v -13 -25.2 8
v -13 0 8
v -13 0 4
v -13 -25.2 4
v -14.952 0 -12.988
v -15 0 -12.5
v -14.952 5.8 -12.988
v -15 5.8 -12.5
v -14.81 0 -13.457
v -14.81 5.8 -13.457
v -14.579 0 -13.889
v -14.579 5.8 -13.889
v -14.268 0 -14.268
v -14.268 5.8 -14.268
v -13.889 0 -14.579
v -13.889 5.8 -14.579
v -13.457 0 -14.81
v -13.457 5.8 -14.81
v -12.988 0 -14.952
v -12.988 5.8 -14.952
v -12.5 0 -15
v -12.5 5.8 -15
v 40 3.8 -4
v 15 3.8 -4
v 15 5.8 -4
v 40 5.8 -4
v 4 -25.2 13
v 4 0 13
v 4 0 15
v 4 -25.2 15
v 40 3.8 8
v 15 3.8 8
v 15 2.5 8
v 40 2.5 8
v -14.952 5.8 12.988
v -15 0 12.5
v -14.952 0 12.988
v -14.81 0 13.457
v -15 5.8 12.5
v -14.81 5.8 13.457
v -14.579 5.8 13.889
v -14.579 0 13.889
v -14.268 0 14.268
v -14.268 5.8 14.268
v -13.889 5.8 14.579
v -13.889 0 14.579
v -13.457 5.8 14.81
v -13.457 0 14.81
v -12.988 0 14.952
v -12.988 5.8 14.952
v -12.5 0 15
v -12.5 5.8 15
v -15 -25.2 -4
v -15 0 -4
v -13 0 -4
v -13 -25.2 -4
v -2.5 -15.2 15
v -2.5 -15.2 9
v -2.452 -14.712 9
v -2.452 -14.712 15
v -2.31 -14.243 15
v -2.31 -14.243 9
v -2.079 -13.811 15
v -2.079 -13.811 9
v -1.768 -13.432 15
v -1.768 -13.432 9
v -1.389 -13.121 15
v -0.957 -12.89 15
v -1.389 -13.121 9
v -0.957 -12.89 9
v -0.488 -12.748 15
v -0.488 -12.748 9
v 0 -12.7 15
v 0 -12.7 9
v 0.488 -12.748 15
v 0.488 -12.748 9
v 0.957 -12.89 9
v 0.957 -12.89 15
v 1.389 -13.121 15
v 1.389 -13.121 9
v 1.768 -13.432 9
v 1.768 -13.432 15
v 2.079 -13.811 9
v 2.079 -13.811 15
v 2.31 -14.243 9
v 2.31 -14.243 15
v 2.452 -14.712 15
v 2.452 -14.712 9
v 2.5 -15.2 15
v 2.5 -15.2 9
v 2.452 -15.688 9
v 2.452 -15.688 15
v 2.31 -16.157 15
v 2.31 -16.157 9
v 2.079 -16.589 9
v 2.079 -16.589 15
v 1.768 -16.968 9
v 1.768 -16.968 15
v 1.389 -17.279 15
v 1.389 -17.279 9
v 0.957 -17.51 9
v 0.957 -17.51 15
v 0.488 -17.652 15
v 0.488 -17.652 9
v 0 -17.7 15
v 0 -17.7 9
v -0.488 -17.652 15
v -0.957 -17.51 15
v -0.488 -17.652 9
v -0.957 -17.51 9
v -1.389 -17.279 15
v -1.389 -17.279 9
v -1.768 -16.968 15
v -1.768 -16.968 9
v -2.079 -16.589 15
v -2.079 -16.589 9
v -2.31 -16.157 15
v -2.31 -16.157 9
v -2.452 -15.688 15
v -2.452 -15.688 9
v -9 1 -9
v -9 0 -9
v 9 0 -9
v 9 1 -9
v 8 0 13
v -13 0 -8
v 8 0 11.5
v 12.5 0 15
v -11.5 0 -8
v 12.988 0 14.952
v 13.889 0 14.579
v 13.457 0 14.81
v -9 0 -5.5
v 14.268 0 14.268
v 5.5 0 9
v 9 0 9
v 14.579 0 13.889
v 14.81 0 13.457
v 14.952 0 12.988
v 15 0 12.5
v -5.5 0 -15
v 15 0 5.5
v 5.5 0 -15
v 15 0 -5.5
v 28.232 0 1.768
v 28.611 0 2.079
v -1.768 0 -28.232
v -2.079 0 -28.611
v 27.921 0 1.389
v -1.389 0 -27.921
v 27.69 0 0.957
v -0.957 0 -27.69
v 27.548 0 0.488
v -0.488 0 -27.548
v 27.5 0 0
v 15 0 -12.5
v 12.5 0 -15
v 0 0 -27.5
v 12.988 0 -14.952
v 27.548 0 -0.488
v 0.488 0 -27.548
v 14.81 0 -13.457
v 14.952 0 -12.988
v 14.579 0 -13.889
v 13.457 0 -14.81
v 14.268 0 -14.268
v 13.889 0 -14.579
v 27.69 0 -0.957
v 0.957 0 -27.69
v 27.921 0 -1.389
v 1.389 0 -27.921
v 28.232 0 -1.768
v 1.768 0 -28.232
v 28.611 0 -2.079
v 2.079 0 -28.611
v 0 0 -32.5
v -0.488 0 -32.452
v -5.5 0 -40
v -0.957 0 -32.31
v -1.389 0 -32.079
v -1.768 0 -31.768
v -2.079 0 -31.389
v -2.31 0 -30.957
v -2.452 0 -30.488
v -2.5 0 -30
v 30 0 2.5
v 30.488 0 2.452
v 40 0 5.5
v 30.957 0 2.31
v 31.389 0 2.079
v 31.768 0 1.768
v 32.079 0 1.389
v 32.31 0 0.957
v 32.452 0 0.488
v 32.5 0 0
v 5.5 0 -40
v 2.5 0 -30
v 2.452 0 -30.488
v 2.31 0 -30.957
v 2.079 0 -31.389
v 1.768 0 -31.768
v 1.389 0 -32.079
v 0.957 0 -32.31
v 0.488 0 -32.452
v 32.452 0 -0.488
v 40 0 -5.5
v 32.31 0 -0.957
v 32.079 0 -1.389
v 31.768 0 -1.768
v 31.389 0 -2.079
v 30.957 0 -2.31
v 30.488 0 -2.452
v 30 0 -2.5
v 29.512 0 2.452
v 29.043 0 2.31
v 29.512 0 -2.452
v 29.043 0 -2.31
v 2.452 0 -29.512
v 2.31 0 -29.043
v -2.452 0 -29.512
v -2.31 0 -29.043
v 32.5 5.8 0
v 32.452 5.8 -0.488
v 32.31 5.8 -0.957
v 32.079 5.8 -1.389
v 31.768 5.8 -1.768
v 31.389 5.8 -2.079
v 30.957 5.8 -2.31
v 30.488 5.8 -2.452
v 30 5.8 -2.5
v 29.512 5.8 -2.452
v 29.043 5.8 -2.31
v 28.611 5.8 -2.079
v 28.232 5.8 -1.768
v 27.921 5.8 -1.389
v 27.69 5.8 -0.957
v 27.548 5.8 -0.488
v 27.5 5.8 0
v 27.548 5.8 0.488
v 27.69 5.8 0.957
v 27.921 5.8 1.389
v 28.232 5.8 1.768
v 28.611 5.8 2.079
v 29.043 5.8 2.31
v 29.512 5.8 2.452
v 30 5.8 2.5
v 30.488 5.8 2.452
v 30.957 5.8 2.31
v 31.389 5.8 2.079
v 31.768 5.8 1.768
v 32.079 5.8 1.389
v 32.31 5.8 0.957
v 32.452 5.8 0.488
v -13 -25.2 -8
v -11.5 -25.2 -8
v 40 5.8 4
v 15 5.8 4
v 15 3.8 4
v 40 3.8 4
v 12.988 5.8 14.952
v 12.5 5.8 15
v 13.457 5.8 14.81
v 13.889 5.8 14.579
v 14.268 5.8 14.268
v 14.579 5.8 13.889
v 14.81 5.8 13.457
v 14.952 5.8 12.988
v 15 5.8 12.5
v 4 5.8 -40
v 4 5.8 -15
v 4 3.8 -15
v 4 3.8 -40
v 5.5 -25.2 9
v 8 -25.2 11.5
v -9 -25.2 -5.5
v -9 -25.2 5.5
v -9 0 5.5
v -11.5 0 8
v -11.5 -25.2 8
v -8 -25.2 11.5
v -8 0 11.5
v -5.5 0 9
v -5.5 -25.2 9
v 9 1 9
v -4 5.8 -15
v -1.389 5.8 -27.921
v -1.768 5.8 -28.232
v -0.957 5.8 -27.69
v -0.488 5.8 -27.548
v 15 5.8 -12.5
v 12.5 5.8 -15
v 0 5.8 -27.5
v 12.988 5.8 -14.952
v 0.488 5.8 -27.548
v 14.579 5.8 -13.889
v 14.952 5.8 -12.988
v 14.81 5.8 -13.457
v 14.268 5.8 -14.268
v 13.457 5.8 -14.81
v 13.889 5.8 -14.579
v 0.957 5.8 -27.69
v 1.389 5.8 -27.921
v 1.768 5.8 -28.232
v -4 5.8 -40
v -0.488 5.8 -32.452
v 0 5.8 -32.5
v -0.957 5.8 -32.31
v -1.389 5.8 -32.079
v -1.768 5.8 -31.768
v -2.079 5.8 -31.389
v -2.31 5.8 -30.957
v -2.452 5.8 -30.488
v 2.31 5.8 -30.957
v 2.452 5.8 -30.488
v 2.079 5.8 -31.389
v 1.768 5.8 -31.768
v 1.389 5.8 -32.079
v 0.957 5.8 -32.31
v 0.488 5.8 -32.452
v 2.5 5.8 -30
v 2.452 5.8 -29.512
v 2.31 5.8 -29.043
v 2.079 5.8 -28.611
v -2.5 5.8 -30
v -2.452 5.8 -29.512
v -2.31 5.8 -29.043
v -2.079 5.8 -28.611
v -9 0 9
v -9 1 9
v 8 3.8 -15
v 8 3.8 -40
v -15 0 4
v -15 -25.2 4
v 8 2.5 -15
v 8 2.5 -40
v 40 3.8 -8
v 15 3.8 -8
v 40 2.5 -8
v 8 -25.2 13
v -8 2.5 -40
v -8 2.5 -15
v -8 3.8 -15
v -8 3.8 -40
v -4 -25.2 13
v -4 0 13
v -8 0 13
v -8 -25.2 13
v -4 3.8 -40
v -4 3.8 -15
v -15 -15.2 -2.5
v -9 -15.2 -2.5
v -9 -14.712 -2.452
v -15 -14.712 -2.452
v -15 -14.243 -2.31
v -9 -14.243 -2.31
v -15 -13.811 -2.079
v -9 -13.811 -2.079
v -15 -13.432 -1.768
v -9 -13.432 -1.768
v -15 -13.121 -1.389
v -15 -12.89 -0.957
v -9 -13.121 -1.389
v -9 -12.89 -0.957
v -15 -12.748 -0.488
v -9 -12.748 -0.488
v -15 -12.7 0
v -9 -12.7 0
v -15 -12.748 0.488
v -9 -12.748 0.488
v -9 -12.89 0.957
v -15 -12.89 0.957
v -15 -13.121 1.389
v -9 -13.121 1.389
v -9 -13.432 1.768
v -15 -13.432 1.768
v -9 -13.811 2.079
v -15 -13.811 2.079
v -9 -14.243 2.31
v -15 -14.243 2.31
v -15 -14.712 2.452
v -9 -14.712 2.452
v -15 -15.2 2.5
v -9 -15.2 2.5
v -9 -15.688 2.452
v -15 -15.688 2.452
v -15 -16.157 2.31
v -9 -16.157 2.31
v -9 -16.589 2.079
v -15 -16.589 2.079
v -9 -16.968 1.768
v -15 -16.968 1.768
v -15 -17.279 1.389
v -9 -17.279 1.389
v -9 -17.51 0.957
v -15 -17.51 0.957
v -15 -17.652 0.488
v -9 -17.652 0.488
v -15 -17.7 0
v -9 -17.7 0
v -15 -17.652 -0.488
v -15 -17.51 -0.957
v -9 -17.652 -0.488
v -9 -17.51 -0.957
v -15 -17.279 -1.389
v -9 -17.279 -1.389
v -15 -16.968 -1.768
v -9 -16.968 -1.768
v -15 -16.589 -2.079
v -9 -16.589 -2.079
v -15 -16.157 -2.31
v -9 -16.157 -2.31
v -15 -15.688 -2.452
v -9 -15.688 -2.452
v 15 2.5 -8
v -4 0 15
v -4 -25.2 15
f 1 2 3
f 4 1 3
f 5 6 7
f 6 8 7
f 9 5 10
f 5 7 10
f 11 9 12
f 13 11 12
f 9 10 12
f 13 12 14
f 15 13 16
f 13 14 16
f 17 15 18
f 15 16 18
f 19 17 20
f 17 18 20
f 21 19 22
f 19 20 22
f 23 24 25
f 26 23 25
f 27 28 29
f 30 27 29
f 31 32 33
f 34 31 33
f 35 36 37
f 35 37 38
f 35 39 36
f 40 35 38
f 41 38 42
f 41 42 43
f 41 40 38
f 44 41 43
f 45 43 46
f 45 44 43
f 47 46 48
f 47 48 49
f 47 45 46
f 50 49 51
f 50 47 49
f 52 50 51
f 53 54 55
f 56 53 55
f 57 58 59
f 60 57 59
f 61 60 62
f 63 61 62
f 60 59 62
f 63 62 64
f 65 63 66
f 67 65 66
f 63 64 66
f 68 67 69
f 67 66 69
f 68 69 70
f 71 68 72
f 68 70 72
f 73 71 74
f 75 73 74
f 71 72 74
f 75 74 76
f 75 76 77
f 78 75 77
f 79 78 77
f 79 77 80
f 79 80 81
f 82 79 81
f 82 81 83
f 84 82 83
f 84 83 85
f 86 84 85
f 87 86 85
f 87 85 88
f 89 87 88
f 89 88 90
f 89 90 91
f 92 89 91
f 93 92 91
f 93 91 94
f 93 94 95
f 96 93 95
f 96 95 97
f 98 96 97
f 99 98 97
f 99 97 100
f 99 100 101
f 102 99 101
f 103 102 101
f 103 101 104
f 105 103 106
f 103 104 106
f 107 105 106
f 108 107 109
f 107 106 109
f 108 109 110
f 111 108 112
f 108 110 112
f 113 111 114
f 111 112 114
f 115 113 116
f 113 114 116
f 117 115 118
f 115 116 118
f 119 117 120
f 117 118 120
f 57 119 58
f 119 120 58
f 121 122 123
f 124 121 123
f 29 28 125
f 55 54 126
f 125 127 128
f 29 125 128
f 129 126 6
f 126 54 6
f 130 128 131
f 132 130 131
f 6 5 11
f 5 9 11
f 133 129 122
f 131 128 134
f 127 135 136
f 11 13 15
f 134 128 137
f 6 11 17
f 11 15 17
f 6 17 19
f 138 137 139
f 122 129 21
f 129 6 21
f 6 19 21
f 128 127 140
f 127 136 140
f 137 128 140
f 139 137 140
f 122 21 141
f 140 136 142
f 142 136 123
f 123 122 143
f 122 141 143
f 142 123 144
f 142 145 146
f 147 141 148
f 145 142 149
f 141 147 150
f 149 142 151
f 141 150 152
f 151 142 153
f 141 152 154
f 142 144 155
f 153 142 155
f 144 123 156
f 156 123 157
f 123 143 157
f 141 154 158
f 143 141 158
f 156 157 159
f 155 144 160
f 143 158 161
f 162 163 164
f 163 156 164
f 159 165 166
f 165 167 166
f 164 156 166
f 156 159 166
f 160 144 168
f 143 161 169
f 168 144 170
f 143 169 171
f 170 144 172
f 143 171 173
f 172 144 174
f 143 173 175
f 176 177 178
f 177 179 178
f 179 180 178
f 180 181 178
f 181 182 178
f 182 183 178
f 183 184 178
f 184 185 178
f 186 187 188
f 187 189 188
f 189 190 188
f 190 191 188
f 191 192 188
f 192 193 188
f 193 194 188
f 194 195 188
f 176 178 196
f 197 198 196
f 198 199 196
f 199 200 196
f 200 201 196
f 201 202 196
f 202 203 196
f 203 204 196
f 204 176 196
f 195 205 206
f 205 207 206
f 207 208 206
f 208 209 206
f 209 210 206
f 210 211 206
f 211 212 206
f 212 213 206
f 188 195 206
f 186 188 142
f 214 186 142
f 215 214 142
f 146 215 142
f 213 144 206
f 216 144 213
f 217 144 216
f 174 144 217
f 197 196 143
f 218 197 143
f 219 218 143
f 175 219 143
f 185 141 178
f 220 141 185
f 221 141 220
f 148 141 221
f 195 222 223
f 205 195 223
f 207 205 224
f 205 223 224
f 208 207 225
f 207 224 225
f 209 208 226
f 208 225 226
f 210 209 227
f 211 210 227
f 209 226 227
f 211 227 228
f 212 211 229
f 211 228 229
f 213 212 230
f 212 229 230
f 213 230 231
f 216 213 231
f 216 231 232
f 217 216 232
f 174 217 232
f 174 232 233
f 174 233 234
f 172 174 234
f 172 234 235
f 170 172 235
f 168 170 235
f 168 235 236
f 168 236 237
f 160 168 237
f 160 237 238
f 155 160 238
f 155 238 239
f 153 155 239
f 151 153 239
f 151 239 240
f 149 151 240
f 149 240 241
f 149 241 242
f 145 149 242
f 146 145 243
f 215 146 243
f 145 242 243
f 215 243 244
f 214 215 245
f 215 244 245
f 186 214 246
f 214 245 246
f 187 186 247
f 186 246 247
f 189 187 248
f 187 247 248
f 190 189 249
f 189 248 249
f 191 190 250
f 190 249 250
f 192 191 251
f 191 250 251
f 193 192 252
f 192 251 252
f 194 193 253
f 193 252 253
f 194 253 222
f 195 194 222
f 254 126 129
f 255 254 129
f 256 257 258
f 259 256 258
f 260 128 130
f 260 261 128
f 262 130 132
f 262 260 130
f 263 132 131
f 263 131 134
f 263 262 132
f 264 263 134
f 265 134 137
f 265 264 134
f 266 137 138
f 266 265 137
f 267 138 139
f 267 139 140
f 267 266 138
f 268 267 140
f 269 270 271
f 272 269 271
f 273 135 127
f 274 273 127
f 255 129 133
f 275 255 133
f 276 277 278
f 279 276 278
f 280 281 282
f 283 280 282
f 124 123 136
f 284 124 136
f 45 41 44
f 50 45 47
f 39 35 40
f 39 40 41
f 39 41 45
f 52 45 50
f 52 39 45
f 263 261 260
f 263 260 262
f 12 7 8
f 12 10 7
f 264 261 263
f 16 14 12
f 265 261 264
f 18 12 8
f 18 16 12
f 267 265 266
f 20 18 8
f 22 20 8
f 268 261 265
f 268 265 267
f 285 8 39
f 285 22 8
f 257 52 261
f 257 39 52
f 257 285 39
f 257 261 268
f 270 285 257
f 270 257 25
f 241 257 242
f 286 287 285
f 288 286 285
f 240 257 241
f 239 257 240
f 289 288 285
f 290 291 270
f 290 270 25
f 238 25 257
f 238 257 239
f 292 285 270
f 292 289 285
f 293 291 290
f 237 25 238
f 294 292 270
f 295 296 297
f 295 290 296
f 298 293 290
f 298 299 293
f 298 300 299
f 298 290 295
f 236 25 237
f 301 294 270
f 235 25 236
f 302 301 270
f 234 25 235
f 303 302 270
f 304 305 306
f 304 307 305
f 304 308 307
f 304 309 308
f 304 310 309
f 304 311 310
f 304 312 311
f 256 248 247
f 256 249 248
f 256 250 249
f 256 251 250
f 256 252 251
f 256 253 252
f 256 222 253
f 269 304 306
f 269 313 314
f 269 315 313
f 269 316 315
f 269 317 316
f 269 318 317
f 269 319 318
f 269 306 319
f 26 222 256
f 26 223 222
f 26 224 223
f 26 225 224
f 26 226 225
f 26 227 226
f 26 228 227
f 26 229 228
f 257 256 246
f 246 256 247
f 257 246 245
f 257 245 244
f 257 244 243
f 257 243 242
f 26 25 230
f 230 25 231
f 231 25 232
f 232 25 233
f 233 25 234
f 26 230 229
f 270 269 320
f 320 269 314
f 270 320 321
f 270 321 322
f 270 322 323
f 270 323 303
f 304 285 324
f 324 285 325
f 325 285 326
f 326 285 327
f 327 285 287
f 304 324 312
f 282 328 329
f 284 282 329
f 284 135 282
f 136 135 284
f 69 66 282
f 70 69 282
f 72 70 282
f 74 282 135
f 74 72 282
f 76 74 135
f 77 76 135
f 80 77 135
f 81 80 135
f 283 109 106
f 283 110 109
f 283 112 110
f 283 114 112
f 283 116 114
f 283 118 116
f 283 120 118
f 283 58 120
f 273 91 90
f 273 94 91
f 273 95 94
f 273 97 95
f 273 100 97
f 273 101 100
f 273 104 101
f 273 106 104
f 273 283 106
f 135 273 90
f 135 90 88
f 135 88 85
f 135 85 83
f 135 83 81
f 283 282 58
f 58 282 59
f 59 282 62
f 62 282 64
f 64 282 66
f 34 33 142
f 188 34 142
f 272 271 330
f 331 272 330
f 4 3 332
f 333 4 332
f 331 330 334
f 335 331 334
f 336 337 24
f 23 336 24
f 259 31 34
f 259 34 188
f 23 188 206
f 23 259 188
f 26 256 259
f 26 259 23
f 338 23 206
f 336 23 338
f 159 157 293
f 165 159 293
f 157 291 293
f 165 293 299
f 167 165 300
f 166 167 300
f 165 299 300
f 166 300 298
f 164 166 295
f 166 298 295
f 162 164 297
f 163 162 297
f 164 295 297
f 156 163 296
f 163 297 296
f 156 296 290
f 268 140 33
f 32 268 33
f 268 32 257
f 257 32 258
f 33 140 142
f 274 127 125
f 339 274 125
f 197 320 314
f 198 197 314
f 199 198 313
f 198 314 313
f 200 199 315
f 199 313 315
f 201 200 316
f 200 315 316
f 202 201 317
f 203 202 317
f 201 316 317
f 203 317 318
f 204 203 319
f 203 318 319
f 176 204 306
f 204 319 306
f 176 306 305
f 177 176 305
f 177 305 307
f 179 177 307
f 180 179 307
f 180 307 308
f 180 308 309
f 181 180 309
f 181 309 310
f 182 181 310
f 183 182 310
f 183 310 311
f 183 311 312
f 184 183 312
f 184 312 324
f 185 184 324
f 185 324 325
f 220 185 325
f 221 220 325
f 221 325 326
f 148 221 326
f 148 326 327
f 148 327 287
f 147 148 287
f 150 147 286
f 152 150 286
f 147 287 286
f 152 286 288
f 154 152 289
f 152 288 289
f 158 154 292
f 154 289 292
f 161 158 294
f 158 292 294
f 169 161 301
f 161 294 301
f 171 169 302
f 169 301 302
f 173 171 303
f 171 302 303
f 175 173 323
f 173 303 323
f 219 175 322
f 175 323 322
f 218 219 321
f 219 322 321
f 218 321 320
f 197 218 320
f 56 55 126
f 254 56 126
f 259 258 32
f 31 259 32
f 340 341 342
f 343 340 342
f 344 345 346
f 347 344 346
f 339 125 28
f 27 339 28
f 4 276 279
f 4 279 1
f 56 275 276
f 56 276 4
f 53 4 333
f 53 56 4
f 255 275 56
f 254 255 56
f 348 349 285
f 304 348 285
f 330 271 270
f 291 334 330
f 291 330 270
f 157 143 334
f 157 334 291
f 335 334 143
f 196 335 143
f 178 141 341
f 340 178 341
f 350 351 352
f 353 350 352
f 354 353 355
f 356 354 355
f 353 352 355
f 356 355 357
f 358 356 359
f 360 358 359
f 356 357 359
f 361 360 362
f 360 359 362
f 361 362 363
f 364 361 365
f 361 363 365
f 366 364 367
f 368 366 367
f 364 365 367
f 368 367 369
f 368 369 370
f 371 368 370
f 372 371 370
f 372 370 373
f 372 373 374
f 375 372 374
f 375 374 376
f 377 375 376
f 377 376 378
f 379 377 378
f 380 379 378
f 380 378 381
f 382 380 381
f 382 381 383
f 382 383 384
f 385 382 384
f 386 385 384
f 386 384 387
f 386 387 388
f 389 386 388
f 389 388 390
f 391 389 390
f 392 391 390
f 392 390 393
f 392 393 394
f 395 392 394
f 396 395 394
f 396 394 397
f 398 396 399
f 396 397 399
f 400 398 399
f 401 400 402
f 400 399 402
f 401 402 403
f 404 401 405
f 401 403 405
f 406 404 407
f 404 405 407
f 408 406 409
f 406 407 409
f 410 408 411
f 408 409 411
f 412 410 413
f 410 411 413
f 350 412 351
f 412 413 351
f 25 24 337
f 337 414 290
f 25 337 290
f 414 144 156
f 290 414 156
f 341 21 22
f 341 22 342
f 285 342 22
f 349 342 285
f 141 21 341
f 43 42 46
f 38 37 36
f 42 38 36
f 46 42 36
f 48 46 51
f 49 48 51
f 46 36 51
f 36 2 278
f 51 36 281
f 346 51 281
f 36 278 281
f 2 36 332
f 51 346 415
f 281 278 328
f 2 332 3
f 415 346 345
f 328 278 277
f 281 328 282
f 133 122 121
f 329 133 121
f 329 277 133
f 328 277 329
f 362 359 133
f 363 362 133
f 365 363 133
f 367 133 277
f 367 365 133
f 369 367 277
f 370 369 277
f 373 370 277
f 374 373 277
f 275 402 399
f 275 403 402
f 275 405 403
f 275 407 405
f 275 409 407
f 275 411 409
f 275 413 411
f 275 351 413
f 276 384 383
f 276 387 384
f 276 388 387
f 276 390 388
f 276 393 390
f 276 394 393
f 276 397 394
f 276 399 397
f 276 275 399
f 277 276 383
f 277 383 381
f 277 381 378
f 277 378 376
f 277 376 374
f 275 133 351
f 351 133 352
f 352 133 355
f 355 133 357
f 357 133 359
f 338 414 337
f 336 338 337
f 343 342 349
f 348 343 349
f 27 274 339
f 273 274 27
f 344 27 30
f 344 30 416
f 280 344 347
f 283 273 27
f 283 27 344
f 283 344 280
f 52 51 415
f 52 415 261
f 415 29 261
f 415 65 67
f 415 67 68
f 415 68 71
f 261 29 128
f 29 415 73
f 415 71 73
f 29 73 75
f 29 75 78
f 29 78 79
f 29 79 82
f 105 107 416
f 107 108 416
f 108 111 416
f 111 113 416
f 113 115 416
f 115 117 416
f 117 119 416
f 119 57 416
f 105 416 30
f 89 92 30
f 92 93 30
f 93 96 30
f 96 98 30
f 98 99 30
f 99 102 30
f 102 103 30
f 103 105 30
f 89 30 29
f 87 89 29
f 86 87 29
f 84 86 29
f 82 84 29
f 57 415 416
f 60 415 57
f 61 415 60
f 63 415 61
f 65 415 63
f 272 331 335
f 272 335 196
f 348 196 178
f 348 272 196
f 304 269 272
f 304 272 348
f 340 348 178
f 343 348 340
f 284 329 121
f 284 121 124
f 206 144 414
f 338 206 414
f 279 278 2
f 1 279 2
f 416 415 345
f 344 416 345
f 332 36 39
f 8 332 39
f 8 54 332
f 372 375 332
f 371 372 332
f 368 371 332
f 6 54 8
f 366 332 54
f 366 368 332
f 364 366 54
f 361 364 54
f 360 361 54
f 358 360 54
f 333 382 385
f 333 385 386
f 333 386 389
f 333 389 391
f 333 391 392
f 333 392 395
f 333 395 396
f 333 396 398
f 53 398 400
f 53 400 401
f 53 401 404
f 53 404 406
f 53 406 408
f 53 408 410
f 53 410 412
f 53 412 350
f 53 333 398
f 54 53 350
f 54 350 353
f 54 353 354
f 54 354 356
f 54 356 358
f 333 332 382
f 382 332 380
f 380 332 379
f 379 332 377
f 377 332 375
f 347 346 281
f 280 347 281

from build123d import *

# Parameters (mm, degrees)
SKETCH_1_W               = 30
SKETCH_1_H               = 30
EXTRUDE_1_DEPTH          = 5.8
EXTRUDE_2_DEPTH          = 25.2
SKETCH_3_W               = 18
SKETCH_3_H               = 18
CUT_EXTRUDE_1_DEPTH      = 1
EXTRUDE_4_DEPTH          = 25
PATTERN_CIRCULAR_1_COUNT = 2
PATTERN_CIRCULAR_1_ANGLE = 90
HOLE_WIZARD_M6_1_D       = 5
HOLE_WIZARD_M6_2_D       = 5
HOLE_WIZARD_M6_3_D       = 5
FILLET_1_R               = 2.5


with BuildPart() as part:
    # 草图1 → 凸台-拉伸1 (new body)
    with BuildSketch(Plane(origin=(0, 0, 0), x_dir=(1, 0, 0), z_dir=(0, 1, 0))):
        Rectangle(SKETCH_1_W, SKETCH_1_H)
    extrude(amount=EXTRUDE_1_DEPTH)

    # 草图2 → 凸台-拉伸2 (add)
    with BuildSketch(Plane(origin=(0, 0, 0), x_dir=(-1, 0, 0), z_dir=(0, -1, 0))):
        Polygon((4, -15), (4, -13), (8, -13), (8, -11.5), (5.5, -9), (-5.5, -9), (-8, -11.5), (-8, -13), (-4, -13), (-4, -15), align=None)
        Polygon((15, 4), (13, 4), (13, 8), (11.5, 8), (9, 5.5), (9, -5.5), (11.5, -8), (13, -8), (13, -4), (15, -4), align=None)
    extrude(amount=EXTRUDE_2_DEPTH)

    # 草图3 → 切除-拉伸1 (cut)
    with BuildSketch(Plane.XZ):
        Rectangle(SKETCH_3_W, SKETCH_3_H)
    extrude(amount=-CUT_EXTRUDE_1_DEPTH, mode=Mode.SUBTRACT)

    # 草图5 → 凸台-拉伸4 (add)
    with BuildSketch(Plane(origin=(0, 0, -15), x_dir=(-1, 0, 0), z_dir=(0, 0, -1))):
        Polygon((-5.5, 0), (5.5, 0), (8, 2.5), (8, 3.8), (4, 3.8), (4, 5.8), (-4, 5.8), (-4, 3.8), (-8, 3.8), (-8, 2.5), align=None)
    extrude_4 = extrude(amount=EXTRUDE_4_DEPTH)

    # 阵列(圆周)1: 凸台-拉伸4 ×2 about axis
    pattern_circular_1_axis = Axis((0, 0, 0), (0, -1, 0))
    for i in range(1, PATTERN_CIRCULAR_1_COUNT):
        add(extrude_4.rotate(pattern_circular_1_axis, i * PATTERN_CIRCULAR_1_ANGLE / (PATTERN_CIRCULAR_1_COUNT - 1)))

    # M6 螺纹孔1 (through all)
    with Locations(Plane(origin=(0, 0, 0), x_dir=(-1, 0, 0), z_dir=(0, -1, 0))):
        with Locations((-30, 0), (0, 30)):
            Hole(HOLE_WIZARD_M6_1_D / 2)

    # M6 螺纹孔2 (through all)
    with Locations(Plane.ZY.offset(15)):
        with Locations((0, -15.2)):
            Hole(HOLE_WIZARD_M6_2_D / 2)

    # M6 螺纹孔3 (through all)
    with Locations(Plane.XY.offset(15)):
        with Locations((0, -15.2)):
            Hole(HOLE_WIZARD_M6_3_D / 2)

    # 圆角1
    fillet_1_edges = [part.edges().sort_by_distance(p)[0] for p in [
        (15, 2.9, 15),
        (-15, 2.9, 15),
        (-15, 2.9, -15),
        (15, 2.9, -15),
    ]]
    fillet(fillet_1_edges, radius=FILLET_1_R)


solid = part.part
